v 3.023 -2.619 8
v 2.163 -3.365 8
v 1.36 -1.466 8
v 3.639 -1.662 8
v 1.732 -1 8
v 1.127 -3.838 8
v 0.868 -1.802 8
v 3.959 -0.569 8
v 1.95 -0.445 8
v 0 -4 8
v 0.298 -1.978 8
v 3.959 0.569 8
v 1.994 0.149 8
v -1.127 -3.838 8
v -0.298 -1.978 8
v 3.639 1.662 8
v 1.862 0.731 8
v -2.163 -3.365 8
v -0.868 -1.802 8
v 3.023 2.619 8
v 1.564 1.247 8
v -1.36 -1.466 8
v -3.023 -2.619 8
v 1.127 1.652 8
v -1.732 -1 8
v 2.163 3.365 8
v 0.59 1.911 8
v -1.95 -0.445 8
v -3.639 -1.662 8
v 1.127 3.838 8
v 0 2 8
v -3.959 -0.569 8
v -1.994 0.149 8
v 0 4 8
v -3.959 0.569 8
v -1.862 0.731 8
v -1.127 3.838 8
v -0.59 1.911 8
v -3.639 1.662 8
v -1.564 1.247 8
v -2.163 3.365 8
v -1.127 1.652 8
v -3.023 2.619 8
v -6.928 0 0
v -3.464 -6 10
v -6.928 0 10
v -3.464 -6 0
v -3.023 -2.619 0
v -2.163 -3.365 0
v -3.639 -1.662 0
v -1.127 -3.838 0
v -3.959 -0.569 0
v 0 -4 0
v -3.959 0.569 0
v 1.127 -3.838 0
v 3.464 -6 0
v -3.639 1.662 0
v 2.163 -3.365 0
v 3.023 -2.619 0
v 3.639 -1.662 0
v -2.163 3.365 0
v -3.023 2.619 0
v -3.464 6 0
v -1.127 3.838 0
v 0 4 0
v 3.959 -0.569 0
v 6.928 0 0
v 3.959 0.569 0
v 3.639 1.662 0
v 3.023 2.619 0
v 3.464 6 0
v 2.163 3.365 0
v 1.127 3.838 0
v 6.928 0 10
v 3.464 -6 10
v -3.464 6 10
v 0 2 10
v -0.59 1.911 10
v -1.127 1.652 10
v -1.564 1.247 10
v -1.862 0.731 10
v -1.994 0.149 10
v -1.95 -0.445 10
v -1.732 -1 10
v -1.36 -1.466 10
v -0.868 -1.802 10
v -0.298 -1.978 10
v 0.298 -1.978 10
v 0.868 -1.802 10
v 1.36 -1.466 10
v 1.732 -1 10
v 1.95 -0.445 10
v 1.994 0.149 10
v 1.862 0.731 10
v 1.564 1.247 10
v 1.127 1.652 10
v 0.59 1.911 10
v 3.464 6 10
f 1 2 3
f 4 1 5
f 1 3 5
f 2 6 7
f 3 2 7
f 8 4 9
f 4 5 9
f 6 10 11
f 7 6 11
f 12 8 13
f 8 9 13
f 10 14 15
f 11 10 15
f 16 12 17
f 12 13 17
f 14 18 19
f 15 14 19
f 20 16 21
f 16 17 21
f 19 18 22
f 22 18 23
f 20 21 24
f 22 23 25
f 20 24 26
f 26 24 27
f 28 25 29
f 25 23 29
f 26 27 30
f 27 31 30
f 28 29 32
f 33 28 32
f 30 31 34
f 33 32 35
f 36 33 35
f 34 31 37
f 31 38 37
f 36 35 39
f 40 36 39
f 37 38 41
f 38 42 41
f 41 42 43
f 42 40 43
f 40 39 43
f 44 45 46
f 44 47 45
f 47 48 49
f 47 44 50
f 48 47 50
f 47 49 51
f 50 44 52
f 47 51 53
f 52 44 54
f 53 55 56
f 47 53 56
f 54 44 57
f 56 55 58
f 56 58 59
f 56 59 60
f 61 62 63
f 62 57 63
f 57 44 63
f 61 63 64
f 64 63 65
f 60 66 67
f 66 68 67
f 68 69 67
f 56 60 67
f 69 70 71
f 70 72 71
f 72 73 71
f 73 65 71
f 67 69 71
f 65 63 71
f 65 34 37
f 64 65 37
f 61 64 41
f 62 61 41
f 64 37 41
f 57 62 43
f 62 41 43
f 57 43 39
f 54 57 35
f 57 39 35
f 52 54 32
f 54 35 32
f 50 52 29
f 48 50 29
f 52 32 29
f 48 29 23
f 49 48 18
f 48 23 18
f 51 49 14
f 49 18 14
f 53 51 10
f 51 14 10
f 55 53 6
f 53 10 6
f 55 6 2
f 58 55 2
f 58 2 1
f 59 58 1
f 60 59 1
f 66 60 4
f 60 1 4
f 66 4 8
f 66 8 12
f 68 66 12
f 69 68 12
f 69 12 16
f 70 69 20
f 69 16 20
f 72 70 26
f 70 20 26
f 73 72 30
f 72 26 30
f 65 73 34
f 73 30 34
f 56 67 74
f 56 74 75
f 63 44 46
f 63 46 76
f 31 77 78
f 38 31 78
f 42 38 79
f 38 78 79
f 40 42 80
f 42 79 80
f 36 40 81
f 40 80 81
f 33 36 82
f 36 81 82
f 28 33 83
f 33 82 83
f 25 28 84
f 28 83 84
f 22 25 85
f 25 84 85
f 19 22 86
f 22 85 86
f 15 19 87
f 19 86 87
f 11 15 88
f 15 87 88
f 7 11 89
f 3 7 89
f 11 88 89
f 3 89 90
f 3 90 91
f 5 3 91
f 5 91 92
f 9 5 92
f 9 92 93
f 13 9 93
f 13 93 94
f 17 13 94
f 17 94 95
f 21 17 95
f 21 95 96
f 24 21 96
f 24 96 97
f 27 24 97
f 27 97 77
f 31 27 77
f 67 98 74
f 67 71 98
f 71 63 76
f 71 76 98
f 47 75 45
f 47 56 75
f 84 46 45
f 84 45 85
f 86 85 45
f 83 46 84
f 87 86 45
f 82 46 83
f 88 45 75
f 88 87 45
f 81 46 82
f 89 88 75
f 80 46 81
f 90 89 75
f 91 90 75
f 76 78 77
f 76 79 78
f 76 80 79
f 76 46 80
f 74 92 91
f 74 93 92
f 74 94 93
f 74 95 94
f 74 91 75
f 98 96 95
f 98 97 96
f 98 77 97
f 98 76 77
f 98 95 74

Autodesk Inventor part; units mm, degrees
ref_plane "YZ Plane" through (0, 0, 0) normal (1, 0, 0) x (0, 1, 0)
ref_plane "XZ Plane" through (0, 0, 0) normal (0, 1, 0) x (-1, 0, 0)
ref_plane "XY Plane" through (0, 0, 0) normal (0, 0, 1) x (1, 0, 0)
sketch "Sketch1" plane through (0, 0, 0) normal (0, 0, 1) x (1, 0, 0)
  line L0 (0, 0) -> (0, -17) construction
  line L1 (-3.4641, -6) -> (-6.9282, 0)
  line L2 (-6.9282, 0) -> (-3.4641, 6)
  line L3 (-3.4641, 6) -> (3.4641, 6)
  line L4 (3.4641, 6) -> (6.9282, 0)
  line L5 (6.9282, 0) -> (3.4641, -6)
  line L6 (3.4641, -6) -> (-3.4641, -6)
  point P0 (0, -6)
  dimension "d0" = 12
extrude "Extrusion1" add sketch "Sketch1" along normal blind 10
hole "Hole1" at (0, 0, 0) direction (0, 0, 1) diameter 4 end through all counterbore diameter 8 counterbore depth 8
thread "Thread1" size "M8x1.25" class "6H" standard "ANSI Metric M Profile" full length
properties part number "HUDSON-1-80"
